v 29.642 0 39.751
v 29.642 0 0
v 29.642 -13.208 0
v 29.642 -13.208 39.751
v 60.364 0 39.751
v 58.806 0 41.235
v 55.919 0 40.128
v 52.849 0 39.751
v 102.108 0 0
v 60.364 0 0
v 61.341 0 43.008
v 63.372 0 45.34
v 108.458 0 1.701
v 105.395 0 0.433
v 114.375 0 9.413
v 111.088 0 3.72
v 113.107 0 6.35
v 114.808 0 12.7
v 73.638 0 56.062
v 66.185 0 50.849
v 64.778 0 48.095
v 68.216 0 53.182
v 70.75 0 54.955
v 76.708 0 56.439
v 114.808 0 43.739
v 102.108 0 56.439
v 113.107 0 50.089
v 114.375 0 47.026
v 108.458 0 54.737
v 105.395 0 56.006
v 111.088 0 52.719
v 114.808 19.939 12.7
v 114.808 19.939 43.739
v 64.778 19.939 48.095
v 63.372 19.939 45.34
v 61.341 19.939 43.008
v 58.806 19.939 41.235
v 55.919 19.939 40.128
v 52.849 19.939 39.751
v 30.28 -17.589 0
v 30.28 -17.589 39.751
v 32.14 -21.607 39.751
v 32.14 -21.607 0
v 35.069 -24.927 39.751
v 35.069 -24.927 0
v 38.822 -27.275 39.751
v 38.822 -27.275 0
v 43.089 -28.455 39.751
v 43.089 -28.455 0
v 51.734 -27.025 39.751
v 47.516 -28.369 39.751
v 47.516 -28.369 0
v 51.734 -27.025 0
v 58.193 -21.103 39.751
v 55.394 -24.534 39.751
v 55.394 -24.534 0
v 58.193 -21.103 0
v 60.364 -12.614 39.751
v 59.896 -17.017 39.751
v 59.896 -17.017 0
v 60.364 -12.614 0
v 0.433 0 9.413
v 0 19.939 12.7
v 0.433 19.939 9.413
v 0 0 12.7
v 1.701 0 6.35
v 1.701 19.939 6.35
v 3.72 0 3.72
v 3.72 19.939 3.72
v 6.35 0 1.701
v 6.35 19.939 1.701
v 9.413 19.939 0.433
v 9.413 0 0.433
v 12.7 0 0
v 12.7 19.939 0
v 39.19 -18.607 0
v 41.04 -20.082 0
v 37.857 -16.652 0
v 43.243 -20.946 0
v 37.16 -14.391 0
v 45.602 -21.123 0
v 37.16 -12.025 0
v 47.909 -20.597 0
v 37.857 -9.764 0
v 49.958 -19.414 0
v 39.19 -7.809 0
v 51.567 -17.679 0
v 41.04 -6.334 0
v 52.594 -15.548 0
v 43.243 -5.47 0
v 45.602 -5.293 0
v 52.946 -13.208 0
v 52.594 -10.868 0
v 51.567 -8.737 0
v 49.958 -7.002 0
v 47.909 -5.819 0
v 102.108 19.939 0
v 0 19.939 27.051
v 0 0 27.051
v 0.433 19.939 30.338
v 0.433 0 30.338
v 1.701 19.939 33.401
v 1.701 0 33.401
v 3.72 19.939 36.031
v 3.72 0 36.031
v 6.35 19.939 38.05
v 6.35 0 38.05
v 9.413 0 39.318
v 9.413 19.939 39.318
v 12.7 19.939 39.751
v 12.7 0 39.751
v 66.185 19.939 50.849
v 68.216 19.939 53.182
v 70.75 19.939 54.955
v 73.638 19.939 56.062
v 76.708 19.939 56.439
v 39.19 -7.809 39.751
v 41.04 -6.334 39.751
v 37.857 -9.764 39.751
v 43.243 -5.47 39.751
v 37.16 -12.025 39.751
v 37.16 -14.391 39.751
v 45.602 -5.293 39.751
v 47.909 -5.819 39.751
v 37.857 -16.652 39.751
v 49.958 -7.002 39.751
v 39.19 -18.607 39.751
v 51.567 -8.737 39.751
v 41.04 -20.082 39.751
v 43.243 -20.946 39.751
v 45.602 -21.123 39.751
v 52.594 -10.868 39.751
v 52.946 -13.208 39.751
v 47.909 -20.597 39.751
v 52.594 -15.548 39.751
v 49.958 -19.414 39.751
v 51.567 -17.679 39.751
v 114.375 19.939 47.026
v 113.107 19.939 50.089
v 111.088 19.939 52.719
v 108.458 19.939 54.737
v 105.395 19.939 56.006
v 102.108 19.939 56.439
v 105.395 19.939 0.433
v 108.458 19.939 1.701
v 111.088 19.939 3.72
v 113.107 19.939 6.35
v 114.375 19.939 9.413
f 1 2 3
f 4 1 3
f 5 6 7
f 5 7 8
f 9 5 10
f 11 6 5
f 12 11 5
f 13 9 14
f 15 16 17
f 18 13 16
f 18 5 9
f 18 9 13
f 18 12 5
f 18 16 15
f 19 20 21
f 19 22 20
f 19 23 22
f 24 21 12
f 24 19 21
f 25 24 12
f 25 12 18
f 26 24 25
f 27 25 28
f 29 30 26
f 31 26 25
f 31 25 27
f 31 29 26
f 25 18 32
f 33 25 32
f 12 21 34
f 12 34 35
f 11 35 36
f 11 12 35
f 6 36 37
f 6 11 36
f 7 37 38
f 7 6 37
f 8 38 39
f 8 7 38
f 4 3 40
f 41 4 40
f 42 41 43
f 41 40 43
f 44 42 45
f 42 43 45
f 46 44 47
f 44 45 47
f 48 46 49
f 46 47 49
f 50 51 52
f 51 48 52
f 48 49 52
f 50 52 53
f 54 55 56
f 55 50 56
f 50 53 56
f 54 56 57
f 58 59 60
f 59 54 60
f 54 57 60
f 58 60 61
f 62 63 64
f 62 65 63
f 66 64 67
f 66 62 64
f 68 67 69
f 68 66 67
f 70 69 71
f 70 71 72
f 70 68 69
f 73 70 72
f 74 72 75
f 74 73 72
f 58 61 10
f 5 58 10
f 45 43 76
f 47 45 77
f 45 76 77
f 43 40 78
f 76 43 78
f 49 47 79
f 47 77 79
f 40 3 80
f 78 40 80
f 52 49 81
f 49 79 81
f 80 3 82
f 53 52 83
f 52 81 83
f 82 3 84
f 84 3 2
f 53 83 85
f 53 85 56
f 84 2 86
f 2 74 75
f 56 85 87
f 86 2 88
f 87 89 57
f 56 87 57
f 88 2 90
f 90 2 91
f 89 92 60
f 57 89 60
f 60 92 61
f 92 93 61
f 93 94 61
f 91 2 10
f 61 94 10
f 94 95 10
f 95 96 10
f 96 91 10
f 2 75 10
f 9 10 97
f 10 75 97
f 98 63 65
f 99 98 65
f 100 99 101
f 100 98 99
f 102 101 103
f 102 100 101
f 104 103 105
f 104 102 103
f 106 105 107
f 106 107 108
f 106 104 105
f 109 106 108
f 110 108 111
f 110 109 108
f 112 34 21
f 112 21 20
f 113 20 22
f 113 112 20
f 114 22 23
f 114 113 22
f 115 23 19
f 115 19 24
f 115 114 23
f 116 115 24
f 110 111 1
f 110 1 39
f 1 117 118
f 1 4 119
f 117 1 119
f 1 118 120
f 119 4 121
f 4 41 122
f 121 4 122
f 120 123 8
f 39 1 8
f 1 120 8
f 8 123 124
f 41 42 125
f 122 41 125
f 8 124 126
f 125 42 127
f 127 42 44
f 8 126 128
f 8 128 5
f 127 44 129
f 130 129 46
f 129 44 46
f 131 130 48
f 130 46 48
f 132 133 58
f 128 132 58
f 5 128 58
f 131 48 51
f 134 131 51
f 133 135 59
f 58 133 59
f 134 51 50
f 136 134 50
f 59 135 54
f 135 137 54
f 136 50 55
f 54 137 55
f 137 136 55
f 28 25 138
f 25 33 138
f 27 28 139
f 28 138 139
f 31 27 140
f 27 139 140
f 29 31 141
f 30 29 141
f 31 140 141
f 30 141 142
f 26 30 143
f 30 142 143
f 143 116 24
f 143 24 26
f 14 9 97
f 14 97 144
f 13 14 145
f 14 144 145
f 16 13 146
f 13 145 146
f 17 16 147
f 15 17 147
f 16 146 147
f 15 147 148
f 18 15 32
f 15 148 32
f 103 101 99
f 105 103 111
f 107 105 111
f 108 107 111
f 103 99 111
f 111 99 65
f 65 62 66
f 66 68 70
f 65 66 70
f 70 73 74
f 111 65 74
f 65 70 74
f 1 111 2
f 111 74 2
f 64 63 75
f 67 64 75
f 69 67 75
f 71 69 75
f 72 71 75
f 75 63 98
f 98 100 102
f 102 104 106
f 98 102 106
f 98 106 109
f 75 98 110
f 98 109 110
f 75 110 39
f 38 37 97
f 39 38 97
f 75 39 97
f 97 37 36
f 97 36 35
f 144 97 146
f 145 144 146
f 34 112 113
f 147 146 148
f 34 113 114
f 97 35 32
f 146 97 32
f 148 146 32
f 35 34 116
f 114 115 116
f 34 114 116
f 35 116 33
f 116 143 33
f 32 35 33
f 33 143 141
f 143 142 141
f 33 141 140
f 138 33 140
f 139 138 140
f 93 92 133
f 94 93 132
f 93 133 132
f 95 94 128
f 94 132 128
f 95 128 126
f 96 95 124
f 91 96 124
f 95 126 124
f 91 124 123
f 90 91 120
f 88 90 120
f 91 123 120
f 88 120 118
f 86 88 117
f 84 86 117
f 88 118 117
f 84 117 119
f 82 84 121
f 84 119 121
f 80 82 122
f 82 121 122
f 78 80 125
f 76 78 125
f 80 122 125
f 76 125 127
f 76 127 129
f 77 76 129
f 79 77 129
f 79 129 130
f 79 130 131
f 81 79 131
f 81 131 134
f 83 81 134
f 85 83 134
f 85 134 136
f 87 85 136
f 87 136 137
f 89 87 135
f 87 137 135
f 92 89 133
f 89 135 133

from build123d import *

# Parameters (mm, degrees)
F1_DEPTH      = 56.4388
F2_W          = 64.008
F2_H          = 16.6878
F3_DEPTH      = 25.4
F3_DEPTH_BACK = 58.166
F4_R          = 12.7
F6_DEPTH      = 19.939
F7_R          = 7.9375
F8_DEPTH      = 39.751


with BuildPart() as f1:
    # F0 (on Top) → F1 (new body)
    with BuildSketch(Plane.XY):
        with BuildLine():
            Line((0, 19.939), (0, 0))
            Line((0, 0), (29.6418, 0))
            Line((29.6418, 0), (29.6418, -13.208))
            ThreePointArc((29.6418, -13.208), (45.3057061406, -28.5721314673), (60.36432694, -12.6142985648))
            Line((60.36432694, -12.6142985648), (60.36432694, 0))
            Line((60.36432694, 0), (114.808, 0))
            Line((114.808, 0), (114.808, 19.939))
            Line((114.808, 19.939), (0, 19.939))
        make_face()
    extrude(amount=F1_DEPTH)

    # F2 (on Front) → F3 (cut, two sides)
    with BuildSketch(Plane.XZ) as f3_sk:
        with Locations((32.004, 48.0949)):
            Rectangle(F2_W, F2_H)
    extrude(amount=-F3_DEPTH, mode=Mode.SUBTRACT)
    extrude(f3_sk.sketch, amount=F3_DEPTH_BACK, mode=Mode.SUBTRACT)

    # F4
    f4_edges = [f1.edges().sort_by_distance(p)[0] for p in [
        (114.808, 9.9695, 56.4388),
        (114.808, 9.9695, 0),
        (64.008, 9.9695, 56.4388),
        (0, 9.9695, 39.751),
        (0, 9.9695, 0),
    ]]
    fillet(f4_edges, radius=F4_R)

    # F5 (on Front) → F6 (join, through all)
    with BuildSketch(Plane.XZ):
        with BuildLine():
            Line((60.36432694, 39.751), (60.3758, 39.751))
            Line((60.3758, 39.751), (64.008, 39.751))
            Line((64.008, 39.751), (64.008, 43.7388))
            ThreePointArc((64.008, 43.7388), (64.2020932514, 45.9506536109), (64.7784403774, 48.0949))
            ThreePointArc((64.7784403774, 48.0949), (60.1278755342, 42.0439718459), (52.8488807547, 39.751))
            Line((52.8488807547, 39.751), (60.36432694, 39.751))
        make_face()
    extrude(amount=-F6_DEPTH)

    # F7 (on face) → F8 (cut, through all)
    with BuildSketch(Plane.XY.offset(39.751)):
        with Locations((45.0088, -13.208)):
            Circle(F7_R)
    extrude(amount=-F8_DEPTH, mode=Mode.SUBTRACT)


solid = f1.part
